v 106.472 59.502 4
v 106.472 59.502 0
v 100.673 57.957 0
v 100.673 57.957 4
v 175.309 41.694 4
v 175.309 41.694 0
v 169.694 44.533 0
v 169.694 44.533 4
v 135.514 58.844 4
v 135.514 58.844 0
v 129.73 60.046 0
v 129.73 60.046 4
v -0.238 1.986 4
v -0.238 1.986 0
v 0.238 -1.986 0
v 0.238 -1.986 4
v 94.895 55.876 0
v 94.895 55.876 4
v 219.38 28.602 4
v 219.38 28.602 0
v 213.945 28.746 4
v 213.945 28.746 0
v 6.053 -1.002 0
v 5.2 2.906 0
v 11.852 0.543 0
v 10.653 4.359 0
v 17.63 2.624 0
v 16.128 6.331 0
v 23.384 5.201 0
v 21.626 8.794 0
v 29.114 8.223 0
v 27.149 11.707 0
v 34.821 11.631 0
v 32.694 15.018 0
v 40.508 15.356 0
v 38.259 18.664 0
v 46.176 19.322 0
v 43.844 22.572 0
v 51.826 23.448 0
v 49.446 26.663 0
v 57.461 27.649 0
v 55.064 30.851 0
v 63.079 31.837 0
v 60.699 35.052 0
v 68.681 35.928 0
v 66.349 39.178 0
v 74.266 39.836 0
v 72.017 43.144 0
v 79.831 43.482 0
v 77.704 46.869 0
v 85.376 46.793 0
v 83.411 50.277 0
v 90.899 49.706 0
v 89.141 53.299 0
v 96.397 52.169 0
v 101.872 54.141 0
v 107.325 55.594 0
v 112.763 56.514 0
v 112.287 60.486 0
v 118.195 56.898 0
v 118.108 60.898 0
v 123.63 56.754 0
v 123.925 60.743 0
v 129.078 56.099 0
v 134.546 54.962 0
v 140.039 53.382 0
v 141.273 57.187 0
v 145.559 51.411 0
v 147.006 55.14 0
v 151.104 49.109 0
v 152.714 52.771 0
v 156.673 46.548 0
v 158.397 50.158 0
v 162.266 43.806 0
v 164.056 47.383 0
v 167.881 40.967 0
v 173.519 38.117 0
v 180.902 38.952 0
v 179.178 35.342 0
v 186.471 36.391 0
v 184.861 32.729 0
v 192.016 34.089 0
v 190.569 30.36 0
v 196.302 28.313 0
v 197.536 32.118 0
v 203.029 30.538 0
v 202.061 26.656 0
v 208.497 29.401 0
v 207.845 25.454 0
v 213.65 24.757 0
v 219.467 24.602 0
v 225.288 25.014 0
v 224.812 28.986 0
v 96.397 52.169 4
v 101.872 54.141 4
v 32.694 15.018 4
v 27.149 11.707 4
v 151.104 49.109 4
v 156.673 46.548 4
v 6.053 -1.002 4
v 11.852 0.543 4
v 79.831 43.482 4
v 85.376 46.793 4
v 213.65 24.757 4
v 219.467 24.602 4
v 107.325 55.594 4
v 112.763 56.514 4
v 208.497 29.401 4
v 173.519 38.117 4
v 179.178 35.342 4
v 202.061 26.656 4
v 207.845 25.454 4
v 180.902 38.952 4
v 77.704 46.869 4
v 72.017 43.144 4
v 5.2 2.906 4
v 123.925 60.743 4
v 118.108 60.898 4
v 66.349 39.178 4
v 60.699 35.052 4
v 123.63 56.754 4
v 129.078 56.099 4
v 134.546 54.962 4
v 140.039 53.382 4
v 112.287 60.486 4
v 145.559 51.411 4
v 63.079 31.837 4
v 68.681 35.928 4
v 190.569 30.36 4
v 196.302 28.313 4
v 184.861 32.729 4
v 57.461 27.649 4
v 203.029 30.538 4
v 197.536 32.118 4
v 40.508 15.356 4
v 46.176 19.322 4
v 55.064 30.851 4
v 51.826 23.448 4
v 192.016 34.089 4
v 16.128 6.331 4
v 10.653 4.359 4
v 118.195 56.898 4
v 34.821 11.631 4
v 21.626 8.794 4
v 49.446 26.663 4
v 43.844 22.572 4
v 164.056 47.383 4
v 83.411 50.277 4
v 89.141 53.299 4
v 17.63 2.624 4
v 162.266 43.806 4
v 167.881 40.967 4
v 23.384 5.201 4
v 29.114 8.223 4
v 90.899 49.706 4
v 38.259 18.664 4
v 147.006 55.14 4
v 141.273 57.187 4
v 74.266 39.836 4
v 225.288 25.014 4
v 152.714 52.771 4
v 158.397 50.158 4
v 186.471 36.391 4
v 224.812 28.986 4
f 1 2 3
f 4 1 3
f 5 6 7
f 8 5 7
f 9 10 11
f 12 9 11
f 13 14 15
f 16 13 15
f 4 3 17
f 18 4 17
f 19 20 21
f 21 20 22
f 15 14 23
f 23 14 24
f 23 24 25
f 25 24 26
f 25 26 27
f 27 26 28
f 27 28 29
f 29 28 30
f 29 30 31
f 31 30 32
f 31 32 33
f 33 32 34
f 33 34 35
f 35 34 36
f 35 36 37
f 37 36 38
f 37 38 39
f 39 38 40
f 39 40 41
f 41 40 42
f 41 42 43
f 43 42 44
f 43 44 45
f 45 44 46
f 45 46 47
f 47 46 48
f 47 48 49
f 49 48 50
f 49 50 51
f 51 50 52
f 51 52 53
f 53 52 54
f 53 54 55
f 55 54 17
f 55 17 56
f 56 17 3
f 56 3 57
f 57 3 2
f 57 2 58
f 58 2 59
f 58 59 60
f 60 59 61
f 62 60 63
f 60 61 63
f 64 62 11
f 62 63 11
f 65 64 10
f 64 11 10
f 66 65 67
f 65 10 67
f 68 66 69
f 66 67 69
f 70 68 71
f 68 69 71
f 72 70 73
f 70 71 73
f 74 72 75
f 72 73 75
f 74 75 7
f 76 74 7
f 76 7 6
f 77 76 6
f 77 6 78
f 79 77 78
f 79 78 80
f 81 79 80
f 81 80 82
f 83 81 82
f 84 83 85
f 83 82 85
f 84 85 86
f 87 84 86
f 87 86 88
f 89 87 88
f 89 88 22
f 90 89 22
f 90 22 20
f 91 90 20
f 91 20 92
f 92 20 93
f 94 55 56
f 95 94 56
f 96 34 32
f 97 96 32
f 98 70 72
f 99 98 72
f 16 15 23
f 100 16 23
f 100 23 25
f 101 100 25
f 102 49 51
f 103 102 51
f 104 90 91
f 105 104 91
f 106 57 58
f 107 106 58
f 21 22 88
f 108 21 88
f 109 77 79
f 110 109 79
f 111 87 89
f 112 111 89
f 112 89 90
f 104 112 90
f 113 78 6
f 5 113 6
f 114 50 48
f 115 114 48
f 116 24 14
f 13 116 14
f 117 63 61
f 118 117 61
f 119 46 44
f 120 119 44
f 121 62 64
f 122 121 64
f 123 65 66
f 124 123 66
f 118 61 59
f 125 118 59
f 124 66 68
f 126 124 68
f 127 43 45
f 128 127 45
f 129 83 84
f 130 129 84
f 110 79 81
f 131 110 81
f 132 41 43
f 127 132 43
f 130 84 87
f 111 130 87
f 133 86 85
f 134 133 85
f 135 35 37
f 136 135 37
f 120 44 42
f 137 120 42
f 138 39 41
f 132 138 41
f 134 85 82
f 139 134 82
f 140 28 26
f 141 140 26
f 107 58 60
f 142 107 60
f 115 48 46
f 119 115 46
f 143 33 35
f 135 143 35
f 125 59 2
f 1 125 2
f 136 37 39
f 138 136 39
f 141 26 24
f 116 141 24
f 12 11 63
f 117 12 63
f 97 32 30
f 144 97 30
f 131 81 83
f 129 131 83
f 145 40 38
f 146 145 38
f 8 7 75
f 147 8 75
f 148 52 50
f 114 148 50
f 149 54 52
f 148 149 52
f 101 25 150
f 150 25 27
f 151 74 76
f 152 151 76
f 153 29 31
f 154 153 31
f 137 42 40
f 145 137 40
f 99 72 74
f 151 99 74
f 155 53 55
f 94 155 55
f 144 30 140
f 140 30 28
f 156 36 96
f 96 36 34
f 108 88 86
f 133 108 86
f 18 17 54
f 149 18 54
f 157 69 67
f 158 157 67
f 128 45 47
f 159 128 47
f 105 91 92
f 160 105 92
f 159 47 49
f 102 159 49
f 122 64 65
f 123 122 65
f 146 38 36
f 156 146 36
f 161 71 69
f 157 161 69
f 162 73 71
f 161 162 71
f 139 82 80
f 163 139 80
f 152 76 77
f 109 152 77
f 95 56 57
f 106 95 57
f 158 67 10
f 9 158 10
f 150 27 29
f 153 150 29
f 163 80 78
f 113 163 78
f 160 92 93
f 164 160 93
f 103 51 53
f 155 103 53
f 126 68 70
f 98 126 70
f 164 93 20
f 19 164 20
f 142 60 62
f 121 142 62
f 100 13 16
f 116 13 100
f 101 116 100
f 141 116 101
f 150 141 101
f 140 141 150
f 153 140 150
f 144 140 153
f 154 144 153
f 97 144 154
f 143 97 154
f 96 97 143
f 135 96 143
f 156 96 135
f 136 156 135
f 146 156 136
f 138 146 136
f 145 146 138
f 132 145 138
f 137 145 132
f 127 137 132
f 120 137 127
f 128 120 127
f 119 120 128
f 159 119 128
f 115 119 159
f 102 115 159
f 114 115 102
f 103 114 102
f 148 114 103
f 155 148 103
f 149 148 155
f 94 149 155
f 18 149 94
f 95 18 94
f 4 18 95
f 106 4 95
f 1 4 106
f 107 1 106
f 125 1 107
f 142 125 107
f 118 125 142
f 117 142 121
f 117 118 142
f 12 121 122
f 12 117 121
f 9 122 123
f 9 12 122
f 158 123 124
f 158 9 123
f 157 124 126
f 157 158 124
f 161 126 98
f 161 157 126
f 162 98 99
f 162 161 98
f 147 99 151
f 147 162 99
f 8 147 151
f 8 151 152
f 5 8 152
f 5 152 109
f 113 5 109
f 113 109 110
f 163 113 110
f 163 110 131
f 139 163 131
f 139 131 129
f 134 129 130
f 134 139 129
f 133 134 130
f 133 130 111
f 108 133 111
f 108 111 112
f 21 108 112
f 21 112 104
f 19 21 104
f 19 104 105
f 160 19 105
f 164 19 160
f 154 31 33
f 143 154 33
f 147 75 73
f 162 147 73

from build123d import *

# Parameters (mm, degrees)
SERVICE_BOW_DEPTH = 4


with BuildPart() as part:
    # 草图1 → Service_Bow (new body)
    with BuildSketch(Plane.XY):
        Polygon((0.238238251, -1.985759939), (6.052696728, -1.00199462), (11.851815581, 0.543134876), (17.629770487, 2.623716718), (23.383882437, 5.20057493), (29.113972134, 8.223185483), (34.821368817, 11.631260703), (40.508013578, 15.356118412), (46.175832601, 19.322053213), (51.826370472, 23.44786233), (57.46060541, 27.648580809), (63.078870472, 31.837413257), (68.680832601, 35.92781796), (74.265513578, 39.8356909), (79.831368817, 43.481597056), (85.376472134, 46.792990637), (90.898882437, 49.706339676), (96.397270487, 52.169010306), (101.871815581, 54.140678109), (107.325196728, 55.593980706), (112.763238251, 56.514240061), (118.194648786, 56.898458582), (123.629616677, 56.754246479), (129.077741493, 56.099396062), (134.546278673, 54.962260391), (140.039426657, 53.382396607), (145.558668032, 51.410746743), (151.103674368, 49.108979529), (156.673265064, 46.548051938), (162.266147999, 43.806258645), (167.881387728, 40.967036021), (173.518647999, 38.116707719), (179.178265064, 35.342287191), (184.861174368, 32.729407041), (190.568668032, 30.36041039), (196.301926657, 28.312591454), (202.061278673, 26.656495644), (207.845241493, 25.454102473), (213.649616677, 24.756703246), (219.467148786, 24.602483256), (225.288238251, 25.014240061), (224.811761749, 28.985759939), (219.380351214, 28.601541418), (213.945383323, 28.745753521), (208.497258507, 29.400603938), (203.028721327, 30.537739609), (197.535573343, 32.117603393), (192.016331968, 34.089253257), (186.471325632, 36.391020471), (180.901734936, 38.951948062), (175.308852001, 41.693741355), (169.693612272, 44.532963979), (164.056352001, 47.383292281), (158.396734936, 50.157712809), (152.713825632, 52.770592959), (147.006331968, 55.13958961), (141.273073343, 57.187408546), (135.513721327, 58.843504356), (129.729758507, 60.045897527), (123.925383323, 60.743296754), (118.107851214, 60.897516744), (112.286761749, 60.485759939), (106.472303272, 59.50199462), (100.673184419, 57.956865124), (94.895229513, 55.876283282), (89.141117563, 53.29942507), (83.411027866, 50.276814517), (77.703631183, 46.868739297), (72.016986422, 43.143881588), (66.349167399, 39.177946787), (60.698629528, 35.05213767), (55.06439459, 30.851419191), (49.446129528, 26.662586743), (43.844167399, 22.57218204), (38.259486422, 18.6643091), (32.693631183, 15.018402944), (27.148527866, 11.707009363), (21.626117563, 8.793660324), (16.127729513, 6.330989694), (10.653184419, 4.359321891), (5.199803272, 2.906019294), (-0.238238251, 1.985759939), align=None)
    extrude(amount=SERVICE_BOW_DEPTH)


solid = part.part
